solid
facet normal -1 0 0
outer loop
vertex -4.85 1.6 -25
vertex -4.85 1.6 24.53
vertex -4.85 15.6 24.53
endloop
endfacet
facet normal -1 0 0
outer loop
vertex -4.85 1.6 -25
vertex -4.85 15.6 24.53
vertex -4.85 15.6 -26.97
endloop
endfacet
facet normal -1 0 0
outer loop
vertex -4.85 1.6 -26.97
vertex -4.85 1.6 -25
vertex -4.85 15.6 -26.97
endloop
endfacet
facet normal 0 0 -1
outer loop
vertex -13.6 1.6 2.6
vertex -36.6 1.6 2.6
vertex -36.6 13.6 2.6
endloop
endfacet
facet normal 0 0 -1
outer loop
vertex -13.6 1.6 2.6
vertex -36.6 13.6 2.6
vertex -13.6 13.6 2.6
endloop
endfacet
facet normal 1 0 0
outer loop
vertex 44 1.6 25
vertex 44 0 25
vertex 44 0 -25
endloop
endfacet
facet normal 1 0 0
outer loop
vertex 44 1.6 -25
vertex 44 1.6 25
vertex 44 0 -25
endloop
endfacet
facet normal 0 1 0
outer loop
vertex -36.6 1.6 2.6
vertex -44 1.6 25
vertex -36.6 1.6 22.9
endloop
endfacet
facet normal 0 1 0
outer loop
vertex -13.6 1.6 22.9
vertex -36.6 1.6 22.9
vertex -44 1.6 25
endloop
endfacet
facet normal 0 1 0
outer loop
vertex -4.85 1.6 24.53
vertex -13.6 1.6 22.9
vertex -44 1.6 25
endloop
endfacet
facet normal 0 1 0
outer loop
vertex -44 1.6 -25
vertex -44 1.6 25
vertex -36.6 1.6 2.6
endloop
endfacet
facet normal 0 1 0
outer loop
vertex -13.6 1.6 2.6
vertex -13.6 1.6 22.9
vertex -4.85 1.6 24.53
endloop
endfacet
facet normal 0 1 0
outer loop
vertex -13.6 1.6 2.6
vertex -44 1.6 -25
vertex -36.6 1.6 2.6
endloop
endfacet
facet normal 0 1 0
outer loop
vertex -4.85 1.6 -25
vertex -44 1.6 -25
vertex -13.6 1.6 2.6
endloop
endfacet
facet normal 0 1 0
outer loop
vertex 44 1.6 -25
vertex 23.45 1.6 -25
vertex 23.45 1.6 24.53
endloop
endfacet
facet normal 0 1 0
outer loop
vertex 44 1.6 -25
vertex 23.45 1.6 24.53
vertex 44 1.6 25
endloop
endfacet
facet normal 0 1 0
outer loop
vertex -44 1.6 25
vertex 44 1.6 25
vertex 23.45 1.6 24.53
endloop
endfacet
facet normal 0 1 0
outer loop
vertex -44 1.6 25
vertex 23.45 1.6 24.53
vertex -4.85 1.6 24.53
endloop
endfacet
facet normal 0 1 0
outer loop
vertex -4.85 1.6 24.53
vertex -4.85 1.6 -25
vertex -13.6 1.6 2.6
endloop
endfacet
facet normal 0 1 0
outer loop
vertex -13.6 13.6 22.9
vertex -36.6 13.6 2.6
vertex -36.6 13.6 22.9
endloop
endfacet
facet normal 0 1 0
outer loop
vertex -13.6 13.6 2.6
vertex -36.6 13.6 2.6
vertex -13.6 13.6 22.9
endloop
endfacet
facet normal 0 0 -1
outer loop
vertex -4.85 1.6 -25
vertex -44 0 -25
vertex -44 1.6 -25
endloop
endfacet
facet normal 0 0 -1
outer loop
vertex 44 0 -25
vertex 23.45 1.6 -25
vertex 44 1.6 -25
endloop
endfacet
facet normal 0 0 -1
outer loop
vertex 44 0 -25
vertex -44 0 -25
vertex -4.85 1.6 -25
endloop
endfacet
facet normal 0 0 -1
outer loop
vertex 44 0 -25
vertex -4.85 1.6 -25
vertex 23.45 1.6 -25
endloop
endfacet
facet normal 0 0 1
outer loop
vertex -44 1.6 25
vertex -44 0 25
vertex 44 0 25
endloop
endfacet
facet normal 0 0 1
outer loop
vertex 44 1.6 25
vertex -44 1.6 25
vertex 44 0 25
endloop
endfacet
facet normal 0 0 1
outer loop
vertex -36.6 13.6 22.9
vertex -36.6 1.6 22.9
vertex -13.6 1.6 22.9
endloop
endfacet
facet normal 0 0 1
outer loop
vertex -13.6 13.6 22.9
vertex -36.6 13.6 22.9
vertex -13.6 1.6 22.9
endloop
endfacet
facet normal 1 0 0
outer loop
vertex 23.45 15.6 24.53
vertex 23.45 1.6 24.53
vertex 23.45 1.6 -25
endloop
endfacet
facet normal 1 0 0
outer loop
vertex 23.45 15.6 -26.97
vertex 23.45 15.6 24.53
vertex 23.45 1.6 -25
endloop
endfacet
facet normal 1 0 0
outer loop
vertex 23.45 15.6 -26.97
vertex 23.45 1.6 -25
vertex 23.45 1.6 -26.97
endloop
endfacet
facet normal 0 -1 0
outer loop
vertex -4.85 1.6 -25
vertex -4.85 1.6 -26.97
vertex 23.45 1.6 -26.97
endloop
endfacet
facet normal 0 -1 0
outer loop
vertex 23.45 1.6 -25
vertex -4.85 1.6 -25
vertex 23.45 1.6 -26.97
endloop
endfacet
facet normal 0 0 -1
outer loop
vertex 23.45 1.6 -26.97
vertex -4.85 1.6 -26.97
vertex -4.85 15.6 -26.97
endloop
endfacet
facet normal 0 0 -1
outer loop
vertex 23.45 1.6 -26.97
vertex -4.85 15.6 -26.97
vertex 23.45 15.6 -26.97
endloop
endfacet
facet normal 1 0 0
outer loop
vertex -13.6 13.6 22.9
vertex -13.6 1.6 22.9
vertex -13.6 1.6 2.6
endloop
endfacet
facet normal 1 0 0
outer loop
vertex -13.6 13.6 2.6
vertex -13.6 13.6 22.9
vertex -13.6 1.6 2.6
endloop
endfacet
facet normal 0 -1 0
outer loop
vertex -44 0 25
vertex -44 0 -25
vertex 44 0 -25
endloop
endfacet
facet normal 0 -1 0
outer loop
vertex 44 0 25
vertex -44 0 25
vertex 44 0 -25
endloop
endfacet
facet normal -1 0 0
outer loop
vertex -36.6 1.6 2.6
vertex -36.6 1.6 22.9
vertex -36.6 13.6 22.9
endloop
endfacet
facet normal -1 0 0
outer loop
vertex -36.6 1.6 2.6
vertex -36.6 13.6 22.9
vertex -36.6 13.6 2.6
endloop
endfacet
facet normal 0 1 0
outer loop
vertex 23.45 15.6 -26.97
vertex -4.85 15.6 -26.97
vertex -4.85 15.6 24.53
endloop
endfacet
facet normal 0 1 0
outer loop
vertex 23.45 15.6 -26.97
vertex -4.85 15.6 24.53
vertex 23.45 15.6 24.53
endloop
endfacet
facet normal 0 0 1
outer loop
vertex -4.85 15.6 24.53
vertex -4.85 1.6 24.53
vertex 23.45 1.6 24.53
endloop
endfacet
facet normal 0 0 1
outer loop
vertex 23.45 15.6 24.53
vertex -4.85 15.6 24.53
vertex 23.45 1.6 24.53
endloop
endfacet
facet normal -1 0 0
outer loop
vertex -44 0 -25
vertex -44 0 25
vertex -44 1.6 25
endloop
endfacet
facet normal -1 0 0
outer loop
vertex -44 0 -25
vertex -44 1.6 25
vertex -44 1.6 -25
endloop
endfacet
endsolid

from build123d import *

# Parameters (mm, degrees)
CROQUIS_PCB_W    = 88
CROQUIS_PCB_H    = 50
PCB_DEPTH        = 1.6
CROQUIS_ESP32_W  = 28.3
CROQUIS_ESP32_H  = 51.5
ESP32_DEPTH      = 14
CROQUIS_INA219_W = 23
CROQUIS_INA219_H = 20.3
INA219_DEPTH     = 12


with BuildPart() as part:
    # Croquis_pcb → PCB (new body)
    with BuildSketch(Plane(origin=(0, 0, 0), x_dir=(1, 0, 0), z_dir=(0, 1, 0))):
        Rectangle(CROQUIS_PCB_W, CROQUIS_PCB_H)
    extrude(amount=PCB_DEPTH)

    # Croquis_esp32 → ESP32 (add)
    with BuildSketch(Plane(origin=(0, 1.6, 0), x_dir=(1, 0, 0), z_dir=(0, 1, 0))):
        with Locations((9.3, 1.22)):
            Rectangle(CROQUIS_ESP32_W, CROQUIS_ESP32_H)
    extrude(amount=ESP32_DEPTH)

    # Croquis_ina219 → INA219 (add)
    with BuildSketch(Plane(origin=(0, 1.6, 0), x_dir=(1, 0, 0), z_dir=(0, 1, 0))):
        with Locations((-25.1, -12.75)):
            Rectangle(CROQUIS_INA219_W, CROQUIS_INA219_H)
    extrude(amount=INA219_DEPTH)


solid = part.part
